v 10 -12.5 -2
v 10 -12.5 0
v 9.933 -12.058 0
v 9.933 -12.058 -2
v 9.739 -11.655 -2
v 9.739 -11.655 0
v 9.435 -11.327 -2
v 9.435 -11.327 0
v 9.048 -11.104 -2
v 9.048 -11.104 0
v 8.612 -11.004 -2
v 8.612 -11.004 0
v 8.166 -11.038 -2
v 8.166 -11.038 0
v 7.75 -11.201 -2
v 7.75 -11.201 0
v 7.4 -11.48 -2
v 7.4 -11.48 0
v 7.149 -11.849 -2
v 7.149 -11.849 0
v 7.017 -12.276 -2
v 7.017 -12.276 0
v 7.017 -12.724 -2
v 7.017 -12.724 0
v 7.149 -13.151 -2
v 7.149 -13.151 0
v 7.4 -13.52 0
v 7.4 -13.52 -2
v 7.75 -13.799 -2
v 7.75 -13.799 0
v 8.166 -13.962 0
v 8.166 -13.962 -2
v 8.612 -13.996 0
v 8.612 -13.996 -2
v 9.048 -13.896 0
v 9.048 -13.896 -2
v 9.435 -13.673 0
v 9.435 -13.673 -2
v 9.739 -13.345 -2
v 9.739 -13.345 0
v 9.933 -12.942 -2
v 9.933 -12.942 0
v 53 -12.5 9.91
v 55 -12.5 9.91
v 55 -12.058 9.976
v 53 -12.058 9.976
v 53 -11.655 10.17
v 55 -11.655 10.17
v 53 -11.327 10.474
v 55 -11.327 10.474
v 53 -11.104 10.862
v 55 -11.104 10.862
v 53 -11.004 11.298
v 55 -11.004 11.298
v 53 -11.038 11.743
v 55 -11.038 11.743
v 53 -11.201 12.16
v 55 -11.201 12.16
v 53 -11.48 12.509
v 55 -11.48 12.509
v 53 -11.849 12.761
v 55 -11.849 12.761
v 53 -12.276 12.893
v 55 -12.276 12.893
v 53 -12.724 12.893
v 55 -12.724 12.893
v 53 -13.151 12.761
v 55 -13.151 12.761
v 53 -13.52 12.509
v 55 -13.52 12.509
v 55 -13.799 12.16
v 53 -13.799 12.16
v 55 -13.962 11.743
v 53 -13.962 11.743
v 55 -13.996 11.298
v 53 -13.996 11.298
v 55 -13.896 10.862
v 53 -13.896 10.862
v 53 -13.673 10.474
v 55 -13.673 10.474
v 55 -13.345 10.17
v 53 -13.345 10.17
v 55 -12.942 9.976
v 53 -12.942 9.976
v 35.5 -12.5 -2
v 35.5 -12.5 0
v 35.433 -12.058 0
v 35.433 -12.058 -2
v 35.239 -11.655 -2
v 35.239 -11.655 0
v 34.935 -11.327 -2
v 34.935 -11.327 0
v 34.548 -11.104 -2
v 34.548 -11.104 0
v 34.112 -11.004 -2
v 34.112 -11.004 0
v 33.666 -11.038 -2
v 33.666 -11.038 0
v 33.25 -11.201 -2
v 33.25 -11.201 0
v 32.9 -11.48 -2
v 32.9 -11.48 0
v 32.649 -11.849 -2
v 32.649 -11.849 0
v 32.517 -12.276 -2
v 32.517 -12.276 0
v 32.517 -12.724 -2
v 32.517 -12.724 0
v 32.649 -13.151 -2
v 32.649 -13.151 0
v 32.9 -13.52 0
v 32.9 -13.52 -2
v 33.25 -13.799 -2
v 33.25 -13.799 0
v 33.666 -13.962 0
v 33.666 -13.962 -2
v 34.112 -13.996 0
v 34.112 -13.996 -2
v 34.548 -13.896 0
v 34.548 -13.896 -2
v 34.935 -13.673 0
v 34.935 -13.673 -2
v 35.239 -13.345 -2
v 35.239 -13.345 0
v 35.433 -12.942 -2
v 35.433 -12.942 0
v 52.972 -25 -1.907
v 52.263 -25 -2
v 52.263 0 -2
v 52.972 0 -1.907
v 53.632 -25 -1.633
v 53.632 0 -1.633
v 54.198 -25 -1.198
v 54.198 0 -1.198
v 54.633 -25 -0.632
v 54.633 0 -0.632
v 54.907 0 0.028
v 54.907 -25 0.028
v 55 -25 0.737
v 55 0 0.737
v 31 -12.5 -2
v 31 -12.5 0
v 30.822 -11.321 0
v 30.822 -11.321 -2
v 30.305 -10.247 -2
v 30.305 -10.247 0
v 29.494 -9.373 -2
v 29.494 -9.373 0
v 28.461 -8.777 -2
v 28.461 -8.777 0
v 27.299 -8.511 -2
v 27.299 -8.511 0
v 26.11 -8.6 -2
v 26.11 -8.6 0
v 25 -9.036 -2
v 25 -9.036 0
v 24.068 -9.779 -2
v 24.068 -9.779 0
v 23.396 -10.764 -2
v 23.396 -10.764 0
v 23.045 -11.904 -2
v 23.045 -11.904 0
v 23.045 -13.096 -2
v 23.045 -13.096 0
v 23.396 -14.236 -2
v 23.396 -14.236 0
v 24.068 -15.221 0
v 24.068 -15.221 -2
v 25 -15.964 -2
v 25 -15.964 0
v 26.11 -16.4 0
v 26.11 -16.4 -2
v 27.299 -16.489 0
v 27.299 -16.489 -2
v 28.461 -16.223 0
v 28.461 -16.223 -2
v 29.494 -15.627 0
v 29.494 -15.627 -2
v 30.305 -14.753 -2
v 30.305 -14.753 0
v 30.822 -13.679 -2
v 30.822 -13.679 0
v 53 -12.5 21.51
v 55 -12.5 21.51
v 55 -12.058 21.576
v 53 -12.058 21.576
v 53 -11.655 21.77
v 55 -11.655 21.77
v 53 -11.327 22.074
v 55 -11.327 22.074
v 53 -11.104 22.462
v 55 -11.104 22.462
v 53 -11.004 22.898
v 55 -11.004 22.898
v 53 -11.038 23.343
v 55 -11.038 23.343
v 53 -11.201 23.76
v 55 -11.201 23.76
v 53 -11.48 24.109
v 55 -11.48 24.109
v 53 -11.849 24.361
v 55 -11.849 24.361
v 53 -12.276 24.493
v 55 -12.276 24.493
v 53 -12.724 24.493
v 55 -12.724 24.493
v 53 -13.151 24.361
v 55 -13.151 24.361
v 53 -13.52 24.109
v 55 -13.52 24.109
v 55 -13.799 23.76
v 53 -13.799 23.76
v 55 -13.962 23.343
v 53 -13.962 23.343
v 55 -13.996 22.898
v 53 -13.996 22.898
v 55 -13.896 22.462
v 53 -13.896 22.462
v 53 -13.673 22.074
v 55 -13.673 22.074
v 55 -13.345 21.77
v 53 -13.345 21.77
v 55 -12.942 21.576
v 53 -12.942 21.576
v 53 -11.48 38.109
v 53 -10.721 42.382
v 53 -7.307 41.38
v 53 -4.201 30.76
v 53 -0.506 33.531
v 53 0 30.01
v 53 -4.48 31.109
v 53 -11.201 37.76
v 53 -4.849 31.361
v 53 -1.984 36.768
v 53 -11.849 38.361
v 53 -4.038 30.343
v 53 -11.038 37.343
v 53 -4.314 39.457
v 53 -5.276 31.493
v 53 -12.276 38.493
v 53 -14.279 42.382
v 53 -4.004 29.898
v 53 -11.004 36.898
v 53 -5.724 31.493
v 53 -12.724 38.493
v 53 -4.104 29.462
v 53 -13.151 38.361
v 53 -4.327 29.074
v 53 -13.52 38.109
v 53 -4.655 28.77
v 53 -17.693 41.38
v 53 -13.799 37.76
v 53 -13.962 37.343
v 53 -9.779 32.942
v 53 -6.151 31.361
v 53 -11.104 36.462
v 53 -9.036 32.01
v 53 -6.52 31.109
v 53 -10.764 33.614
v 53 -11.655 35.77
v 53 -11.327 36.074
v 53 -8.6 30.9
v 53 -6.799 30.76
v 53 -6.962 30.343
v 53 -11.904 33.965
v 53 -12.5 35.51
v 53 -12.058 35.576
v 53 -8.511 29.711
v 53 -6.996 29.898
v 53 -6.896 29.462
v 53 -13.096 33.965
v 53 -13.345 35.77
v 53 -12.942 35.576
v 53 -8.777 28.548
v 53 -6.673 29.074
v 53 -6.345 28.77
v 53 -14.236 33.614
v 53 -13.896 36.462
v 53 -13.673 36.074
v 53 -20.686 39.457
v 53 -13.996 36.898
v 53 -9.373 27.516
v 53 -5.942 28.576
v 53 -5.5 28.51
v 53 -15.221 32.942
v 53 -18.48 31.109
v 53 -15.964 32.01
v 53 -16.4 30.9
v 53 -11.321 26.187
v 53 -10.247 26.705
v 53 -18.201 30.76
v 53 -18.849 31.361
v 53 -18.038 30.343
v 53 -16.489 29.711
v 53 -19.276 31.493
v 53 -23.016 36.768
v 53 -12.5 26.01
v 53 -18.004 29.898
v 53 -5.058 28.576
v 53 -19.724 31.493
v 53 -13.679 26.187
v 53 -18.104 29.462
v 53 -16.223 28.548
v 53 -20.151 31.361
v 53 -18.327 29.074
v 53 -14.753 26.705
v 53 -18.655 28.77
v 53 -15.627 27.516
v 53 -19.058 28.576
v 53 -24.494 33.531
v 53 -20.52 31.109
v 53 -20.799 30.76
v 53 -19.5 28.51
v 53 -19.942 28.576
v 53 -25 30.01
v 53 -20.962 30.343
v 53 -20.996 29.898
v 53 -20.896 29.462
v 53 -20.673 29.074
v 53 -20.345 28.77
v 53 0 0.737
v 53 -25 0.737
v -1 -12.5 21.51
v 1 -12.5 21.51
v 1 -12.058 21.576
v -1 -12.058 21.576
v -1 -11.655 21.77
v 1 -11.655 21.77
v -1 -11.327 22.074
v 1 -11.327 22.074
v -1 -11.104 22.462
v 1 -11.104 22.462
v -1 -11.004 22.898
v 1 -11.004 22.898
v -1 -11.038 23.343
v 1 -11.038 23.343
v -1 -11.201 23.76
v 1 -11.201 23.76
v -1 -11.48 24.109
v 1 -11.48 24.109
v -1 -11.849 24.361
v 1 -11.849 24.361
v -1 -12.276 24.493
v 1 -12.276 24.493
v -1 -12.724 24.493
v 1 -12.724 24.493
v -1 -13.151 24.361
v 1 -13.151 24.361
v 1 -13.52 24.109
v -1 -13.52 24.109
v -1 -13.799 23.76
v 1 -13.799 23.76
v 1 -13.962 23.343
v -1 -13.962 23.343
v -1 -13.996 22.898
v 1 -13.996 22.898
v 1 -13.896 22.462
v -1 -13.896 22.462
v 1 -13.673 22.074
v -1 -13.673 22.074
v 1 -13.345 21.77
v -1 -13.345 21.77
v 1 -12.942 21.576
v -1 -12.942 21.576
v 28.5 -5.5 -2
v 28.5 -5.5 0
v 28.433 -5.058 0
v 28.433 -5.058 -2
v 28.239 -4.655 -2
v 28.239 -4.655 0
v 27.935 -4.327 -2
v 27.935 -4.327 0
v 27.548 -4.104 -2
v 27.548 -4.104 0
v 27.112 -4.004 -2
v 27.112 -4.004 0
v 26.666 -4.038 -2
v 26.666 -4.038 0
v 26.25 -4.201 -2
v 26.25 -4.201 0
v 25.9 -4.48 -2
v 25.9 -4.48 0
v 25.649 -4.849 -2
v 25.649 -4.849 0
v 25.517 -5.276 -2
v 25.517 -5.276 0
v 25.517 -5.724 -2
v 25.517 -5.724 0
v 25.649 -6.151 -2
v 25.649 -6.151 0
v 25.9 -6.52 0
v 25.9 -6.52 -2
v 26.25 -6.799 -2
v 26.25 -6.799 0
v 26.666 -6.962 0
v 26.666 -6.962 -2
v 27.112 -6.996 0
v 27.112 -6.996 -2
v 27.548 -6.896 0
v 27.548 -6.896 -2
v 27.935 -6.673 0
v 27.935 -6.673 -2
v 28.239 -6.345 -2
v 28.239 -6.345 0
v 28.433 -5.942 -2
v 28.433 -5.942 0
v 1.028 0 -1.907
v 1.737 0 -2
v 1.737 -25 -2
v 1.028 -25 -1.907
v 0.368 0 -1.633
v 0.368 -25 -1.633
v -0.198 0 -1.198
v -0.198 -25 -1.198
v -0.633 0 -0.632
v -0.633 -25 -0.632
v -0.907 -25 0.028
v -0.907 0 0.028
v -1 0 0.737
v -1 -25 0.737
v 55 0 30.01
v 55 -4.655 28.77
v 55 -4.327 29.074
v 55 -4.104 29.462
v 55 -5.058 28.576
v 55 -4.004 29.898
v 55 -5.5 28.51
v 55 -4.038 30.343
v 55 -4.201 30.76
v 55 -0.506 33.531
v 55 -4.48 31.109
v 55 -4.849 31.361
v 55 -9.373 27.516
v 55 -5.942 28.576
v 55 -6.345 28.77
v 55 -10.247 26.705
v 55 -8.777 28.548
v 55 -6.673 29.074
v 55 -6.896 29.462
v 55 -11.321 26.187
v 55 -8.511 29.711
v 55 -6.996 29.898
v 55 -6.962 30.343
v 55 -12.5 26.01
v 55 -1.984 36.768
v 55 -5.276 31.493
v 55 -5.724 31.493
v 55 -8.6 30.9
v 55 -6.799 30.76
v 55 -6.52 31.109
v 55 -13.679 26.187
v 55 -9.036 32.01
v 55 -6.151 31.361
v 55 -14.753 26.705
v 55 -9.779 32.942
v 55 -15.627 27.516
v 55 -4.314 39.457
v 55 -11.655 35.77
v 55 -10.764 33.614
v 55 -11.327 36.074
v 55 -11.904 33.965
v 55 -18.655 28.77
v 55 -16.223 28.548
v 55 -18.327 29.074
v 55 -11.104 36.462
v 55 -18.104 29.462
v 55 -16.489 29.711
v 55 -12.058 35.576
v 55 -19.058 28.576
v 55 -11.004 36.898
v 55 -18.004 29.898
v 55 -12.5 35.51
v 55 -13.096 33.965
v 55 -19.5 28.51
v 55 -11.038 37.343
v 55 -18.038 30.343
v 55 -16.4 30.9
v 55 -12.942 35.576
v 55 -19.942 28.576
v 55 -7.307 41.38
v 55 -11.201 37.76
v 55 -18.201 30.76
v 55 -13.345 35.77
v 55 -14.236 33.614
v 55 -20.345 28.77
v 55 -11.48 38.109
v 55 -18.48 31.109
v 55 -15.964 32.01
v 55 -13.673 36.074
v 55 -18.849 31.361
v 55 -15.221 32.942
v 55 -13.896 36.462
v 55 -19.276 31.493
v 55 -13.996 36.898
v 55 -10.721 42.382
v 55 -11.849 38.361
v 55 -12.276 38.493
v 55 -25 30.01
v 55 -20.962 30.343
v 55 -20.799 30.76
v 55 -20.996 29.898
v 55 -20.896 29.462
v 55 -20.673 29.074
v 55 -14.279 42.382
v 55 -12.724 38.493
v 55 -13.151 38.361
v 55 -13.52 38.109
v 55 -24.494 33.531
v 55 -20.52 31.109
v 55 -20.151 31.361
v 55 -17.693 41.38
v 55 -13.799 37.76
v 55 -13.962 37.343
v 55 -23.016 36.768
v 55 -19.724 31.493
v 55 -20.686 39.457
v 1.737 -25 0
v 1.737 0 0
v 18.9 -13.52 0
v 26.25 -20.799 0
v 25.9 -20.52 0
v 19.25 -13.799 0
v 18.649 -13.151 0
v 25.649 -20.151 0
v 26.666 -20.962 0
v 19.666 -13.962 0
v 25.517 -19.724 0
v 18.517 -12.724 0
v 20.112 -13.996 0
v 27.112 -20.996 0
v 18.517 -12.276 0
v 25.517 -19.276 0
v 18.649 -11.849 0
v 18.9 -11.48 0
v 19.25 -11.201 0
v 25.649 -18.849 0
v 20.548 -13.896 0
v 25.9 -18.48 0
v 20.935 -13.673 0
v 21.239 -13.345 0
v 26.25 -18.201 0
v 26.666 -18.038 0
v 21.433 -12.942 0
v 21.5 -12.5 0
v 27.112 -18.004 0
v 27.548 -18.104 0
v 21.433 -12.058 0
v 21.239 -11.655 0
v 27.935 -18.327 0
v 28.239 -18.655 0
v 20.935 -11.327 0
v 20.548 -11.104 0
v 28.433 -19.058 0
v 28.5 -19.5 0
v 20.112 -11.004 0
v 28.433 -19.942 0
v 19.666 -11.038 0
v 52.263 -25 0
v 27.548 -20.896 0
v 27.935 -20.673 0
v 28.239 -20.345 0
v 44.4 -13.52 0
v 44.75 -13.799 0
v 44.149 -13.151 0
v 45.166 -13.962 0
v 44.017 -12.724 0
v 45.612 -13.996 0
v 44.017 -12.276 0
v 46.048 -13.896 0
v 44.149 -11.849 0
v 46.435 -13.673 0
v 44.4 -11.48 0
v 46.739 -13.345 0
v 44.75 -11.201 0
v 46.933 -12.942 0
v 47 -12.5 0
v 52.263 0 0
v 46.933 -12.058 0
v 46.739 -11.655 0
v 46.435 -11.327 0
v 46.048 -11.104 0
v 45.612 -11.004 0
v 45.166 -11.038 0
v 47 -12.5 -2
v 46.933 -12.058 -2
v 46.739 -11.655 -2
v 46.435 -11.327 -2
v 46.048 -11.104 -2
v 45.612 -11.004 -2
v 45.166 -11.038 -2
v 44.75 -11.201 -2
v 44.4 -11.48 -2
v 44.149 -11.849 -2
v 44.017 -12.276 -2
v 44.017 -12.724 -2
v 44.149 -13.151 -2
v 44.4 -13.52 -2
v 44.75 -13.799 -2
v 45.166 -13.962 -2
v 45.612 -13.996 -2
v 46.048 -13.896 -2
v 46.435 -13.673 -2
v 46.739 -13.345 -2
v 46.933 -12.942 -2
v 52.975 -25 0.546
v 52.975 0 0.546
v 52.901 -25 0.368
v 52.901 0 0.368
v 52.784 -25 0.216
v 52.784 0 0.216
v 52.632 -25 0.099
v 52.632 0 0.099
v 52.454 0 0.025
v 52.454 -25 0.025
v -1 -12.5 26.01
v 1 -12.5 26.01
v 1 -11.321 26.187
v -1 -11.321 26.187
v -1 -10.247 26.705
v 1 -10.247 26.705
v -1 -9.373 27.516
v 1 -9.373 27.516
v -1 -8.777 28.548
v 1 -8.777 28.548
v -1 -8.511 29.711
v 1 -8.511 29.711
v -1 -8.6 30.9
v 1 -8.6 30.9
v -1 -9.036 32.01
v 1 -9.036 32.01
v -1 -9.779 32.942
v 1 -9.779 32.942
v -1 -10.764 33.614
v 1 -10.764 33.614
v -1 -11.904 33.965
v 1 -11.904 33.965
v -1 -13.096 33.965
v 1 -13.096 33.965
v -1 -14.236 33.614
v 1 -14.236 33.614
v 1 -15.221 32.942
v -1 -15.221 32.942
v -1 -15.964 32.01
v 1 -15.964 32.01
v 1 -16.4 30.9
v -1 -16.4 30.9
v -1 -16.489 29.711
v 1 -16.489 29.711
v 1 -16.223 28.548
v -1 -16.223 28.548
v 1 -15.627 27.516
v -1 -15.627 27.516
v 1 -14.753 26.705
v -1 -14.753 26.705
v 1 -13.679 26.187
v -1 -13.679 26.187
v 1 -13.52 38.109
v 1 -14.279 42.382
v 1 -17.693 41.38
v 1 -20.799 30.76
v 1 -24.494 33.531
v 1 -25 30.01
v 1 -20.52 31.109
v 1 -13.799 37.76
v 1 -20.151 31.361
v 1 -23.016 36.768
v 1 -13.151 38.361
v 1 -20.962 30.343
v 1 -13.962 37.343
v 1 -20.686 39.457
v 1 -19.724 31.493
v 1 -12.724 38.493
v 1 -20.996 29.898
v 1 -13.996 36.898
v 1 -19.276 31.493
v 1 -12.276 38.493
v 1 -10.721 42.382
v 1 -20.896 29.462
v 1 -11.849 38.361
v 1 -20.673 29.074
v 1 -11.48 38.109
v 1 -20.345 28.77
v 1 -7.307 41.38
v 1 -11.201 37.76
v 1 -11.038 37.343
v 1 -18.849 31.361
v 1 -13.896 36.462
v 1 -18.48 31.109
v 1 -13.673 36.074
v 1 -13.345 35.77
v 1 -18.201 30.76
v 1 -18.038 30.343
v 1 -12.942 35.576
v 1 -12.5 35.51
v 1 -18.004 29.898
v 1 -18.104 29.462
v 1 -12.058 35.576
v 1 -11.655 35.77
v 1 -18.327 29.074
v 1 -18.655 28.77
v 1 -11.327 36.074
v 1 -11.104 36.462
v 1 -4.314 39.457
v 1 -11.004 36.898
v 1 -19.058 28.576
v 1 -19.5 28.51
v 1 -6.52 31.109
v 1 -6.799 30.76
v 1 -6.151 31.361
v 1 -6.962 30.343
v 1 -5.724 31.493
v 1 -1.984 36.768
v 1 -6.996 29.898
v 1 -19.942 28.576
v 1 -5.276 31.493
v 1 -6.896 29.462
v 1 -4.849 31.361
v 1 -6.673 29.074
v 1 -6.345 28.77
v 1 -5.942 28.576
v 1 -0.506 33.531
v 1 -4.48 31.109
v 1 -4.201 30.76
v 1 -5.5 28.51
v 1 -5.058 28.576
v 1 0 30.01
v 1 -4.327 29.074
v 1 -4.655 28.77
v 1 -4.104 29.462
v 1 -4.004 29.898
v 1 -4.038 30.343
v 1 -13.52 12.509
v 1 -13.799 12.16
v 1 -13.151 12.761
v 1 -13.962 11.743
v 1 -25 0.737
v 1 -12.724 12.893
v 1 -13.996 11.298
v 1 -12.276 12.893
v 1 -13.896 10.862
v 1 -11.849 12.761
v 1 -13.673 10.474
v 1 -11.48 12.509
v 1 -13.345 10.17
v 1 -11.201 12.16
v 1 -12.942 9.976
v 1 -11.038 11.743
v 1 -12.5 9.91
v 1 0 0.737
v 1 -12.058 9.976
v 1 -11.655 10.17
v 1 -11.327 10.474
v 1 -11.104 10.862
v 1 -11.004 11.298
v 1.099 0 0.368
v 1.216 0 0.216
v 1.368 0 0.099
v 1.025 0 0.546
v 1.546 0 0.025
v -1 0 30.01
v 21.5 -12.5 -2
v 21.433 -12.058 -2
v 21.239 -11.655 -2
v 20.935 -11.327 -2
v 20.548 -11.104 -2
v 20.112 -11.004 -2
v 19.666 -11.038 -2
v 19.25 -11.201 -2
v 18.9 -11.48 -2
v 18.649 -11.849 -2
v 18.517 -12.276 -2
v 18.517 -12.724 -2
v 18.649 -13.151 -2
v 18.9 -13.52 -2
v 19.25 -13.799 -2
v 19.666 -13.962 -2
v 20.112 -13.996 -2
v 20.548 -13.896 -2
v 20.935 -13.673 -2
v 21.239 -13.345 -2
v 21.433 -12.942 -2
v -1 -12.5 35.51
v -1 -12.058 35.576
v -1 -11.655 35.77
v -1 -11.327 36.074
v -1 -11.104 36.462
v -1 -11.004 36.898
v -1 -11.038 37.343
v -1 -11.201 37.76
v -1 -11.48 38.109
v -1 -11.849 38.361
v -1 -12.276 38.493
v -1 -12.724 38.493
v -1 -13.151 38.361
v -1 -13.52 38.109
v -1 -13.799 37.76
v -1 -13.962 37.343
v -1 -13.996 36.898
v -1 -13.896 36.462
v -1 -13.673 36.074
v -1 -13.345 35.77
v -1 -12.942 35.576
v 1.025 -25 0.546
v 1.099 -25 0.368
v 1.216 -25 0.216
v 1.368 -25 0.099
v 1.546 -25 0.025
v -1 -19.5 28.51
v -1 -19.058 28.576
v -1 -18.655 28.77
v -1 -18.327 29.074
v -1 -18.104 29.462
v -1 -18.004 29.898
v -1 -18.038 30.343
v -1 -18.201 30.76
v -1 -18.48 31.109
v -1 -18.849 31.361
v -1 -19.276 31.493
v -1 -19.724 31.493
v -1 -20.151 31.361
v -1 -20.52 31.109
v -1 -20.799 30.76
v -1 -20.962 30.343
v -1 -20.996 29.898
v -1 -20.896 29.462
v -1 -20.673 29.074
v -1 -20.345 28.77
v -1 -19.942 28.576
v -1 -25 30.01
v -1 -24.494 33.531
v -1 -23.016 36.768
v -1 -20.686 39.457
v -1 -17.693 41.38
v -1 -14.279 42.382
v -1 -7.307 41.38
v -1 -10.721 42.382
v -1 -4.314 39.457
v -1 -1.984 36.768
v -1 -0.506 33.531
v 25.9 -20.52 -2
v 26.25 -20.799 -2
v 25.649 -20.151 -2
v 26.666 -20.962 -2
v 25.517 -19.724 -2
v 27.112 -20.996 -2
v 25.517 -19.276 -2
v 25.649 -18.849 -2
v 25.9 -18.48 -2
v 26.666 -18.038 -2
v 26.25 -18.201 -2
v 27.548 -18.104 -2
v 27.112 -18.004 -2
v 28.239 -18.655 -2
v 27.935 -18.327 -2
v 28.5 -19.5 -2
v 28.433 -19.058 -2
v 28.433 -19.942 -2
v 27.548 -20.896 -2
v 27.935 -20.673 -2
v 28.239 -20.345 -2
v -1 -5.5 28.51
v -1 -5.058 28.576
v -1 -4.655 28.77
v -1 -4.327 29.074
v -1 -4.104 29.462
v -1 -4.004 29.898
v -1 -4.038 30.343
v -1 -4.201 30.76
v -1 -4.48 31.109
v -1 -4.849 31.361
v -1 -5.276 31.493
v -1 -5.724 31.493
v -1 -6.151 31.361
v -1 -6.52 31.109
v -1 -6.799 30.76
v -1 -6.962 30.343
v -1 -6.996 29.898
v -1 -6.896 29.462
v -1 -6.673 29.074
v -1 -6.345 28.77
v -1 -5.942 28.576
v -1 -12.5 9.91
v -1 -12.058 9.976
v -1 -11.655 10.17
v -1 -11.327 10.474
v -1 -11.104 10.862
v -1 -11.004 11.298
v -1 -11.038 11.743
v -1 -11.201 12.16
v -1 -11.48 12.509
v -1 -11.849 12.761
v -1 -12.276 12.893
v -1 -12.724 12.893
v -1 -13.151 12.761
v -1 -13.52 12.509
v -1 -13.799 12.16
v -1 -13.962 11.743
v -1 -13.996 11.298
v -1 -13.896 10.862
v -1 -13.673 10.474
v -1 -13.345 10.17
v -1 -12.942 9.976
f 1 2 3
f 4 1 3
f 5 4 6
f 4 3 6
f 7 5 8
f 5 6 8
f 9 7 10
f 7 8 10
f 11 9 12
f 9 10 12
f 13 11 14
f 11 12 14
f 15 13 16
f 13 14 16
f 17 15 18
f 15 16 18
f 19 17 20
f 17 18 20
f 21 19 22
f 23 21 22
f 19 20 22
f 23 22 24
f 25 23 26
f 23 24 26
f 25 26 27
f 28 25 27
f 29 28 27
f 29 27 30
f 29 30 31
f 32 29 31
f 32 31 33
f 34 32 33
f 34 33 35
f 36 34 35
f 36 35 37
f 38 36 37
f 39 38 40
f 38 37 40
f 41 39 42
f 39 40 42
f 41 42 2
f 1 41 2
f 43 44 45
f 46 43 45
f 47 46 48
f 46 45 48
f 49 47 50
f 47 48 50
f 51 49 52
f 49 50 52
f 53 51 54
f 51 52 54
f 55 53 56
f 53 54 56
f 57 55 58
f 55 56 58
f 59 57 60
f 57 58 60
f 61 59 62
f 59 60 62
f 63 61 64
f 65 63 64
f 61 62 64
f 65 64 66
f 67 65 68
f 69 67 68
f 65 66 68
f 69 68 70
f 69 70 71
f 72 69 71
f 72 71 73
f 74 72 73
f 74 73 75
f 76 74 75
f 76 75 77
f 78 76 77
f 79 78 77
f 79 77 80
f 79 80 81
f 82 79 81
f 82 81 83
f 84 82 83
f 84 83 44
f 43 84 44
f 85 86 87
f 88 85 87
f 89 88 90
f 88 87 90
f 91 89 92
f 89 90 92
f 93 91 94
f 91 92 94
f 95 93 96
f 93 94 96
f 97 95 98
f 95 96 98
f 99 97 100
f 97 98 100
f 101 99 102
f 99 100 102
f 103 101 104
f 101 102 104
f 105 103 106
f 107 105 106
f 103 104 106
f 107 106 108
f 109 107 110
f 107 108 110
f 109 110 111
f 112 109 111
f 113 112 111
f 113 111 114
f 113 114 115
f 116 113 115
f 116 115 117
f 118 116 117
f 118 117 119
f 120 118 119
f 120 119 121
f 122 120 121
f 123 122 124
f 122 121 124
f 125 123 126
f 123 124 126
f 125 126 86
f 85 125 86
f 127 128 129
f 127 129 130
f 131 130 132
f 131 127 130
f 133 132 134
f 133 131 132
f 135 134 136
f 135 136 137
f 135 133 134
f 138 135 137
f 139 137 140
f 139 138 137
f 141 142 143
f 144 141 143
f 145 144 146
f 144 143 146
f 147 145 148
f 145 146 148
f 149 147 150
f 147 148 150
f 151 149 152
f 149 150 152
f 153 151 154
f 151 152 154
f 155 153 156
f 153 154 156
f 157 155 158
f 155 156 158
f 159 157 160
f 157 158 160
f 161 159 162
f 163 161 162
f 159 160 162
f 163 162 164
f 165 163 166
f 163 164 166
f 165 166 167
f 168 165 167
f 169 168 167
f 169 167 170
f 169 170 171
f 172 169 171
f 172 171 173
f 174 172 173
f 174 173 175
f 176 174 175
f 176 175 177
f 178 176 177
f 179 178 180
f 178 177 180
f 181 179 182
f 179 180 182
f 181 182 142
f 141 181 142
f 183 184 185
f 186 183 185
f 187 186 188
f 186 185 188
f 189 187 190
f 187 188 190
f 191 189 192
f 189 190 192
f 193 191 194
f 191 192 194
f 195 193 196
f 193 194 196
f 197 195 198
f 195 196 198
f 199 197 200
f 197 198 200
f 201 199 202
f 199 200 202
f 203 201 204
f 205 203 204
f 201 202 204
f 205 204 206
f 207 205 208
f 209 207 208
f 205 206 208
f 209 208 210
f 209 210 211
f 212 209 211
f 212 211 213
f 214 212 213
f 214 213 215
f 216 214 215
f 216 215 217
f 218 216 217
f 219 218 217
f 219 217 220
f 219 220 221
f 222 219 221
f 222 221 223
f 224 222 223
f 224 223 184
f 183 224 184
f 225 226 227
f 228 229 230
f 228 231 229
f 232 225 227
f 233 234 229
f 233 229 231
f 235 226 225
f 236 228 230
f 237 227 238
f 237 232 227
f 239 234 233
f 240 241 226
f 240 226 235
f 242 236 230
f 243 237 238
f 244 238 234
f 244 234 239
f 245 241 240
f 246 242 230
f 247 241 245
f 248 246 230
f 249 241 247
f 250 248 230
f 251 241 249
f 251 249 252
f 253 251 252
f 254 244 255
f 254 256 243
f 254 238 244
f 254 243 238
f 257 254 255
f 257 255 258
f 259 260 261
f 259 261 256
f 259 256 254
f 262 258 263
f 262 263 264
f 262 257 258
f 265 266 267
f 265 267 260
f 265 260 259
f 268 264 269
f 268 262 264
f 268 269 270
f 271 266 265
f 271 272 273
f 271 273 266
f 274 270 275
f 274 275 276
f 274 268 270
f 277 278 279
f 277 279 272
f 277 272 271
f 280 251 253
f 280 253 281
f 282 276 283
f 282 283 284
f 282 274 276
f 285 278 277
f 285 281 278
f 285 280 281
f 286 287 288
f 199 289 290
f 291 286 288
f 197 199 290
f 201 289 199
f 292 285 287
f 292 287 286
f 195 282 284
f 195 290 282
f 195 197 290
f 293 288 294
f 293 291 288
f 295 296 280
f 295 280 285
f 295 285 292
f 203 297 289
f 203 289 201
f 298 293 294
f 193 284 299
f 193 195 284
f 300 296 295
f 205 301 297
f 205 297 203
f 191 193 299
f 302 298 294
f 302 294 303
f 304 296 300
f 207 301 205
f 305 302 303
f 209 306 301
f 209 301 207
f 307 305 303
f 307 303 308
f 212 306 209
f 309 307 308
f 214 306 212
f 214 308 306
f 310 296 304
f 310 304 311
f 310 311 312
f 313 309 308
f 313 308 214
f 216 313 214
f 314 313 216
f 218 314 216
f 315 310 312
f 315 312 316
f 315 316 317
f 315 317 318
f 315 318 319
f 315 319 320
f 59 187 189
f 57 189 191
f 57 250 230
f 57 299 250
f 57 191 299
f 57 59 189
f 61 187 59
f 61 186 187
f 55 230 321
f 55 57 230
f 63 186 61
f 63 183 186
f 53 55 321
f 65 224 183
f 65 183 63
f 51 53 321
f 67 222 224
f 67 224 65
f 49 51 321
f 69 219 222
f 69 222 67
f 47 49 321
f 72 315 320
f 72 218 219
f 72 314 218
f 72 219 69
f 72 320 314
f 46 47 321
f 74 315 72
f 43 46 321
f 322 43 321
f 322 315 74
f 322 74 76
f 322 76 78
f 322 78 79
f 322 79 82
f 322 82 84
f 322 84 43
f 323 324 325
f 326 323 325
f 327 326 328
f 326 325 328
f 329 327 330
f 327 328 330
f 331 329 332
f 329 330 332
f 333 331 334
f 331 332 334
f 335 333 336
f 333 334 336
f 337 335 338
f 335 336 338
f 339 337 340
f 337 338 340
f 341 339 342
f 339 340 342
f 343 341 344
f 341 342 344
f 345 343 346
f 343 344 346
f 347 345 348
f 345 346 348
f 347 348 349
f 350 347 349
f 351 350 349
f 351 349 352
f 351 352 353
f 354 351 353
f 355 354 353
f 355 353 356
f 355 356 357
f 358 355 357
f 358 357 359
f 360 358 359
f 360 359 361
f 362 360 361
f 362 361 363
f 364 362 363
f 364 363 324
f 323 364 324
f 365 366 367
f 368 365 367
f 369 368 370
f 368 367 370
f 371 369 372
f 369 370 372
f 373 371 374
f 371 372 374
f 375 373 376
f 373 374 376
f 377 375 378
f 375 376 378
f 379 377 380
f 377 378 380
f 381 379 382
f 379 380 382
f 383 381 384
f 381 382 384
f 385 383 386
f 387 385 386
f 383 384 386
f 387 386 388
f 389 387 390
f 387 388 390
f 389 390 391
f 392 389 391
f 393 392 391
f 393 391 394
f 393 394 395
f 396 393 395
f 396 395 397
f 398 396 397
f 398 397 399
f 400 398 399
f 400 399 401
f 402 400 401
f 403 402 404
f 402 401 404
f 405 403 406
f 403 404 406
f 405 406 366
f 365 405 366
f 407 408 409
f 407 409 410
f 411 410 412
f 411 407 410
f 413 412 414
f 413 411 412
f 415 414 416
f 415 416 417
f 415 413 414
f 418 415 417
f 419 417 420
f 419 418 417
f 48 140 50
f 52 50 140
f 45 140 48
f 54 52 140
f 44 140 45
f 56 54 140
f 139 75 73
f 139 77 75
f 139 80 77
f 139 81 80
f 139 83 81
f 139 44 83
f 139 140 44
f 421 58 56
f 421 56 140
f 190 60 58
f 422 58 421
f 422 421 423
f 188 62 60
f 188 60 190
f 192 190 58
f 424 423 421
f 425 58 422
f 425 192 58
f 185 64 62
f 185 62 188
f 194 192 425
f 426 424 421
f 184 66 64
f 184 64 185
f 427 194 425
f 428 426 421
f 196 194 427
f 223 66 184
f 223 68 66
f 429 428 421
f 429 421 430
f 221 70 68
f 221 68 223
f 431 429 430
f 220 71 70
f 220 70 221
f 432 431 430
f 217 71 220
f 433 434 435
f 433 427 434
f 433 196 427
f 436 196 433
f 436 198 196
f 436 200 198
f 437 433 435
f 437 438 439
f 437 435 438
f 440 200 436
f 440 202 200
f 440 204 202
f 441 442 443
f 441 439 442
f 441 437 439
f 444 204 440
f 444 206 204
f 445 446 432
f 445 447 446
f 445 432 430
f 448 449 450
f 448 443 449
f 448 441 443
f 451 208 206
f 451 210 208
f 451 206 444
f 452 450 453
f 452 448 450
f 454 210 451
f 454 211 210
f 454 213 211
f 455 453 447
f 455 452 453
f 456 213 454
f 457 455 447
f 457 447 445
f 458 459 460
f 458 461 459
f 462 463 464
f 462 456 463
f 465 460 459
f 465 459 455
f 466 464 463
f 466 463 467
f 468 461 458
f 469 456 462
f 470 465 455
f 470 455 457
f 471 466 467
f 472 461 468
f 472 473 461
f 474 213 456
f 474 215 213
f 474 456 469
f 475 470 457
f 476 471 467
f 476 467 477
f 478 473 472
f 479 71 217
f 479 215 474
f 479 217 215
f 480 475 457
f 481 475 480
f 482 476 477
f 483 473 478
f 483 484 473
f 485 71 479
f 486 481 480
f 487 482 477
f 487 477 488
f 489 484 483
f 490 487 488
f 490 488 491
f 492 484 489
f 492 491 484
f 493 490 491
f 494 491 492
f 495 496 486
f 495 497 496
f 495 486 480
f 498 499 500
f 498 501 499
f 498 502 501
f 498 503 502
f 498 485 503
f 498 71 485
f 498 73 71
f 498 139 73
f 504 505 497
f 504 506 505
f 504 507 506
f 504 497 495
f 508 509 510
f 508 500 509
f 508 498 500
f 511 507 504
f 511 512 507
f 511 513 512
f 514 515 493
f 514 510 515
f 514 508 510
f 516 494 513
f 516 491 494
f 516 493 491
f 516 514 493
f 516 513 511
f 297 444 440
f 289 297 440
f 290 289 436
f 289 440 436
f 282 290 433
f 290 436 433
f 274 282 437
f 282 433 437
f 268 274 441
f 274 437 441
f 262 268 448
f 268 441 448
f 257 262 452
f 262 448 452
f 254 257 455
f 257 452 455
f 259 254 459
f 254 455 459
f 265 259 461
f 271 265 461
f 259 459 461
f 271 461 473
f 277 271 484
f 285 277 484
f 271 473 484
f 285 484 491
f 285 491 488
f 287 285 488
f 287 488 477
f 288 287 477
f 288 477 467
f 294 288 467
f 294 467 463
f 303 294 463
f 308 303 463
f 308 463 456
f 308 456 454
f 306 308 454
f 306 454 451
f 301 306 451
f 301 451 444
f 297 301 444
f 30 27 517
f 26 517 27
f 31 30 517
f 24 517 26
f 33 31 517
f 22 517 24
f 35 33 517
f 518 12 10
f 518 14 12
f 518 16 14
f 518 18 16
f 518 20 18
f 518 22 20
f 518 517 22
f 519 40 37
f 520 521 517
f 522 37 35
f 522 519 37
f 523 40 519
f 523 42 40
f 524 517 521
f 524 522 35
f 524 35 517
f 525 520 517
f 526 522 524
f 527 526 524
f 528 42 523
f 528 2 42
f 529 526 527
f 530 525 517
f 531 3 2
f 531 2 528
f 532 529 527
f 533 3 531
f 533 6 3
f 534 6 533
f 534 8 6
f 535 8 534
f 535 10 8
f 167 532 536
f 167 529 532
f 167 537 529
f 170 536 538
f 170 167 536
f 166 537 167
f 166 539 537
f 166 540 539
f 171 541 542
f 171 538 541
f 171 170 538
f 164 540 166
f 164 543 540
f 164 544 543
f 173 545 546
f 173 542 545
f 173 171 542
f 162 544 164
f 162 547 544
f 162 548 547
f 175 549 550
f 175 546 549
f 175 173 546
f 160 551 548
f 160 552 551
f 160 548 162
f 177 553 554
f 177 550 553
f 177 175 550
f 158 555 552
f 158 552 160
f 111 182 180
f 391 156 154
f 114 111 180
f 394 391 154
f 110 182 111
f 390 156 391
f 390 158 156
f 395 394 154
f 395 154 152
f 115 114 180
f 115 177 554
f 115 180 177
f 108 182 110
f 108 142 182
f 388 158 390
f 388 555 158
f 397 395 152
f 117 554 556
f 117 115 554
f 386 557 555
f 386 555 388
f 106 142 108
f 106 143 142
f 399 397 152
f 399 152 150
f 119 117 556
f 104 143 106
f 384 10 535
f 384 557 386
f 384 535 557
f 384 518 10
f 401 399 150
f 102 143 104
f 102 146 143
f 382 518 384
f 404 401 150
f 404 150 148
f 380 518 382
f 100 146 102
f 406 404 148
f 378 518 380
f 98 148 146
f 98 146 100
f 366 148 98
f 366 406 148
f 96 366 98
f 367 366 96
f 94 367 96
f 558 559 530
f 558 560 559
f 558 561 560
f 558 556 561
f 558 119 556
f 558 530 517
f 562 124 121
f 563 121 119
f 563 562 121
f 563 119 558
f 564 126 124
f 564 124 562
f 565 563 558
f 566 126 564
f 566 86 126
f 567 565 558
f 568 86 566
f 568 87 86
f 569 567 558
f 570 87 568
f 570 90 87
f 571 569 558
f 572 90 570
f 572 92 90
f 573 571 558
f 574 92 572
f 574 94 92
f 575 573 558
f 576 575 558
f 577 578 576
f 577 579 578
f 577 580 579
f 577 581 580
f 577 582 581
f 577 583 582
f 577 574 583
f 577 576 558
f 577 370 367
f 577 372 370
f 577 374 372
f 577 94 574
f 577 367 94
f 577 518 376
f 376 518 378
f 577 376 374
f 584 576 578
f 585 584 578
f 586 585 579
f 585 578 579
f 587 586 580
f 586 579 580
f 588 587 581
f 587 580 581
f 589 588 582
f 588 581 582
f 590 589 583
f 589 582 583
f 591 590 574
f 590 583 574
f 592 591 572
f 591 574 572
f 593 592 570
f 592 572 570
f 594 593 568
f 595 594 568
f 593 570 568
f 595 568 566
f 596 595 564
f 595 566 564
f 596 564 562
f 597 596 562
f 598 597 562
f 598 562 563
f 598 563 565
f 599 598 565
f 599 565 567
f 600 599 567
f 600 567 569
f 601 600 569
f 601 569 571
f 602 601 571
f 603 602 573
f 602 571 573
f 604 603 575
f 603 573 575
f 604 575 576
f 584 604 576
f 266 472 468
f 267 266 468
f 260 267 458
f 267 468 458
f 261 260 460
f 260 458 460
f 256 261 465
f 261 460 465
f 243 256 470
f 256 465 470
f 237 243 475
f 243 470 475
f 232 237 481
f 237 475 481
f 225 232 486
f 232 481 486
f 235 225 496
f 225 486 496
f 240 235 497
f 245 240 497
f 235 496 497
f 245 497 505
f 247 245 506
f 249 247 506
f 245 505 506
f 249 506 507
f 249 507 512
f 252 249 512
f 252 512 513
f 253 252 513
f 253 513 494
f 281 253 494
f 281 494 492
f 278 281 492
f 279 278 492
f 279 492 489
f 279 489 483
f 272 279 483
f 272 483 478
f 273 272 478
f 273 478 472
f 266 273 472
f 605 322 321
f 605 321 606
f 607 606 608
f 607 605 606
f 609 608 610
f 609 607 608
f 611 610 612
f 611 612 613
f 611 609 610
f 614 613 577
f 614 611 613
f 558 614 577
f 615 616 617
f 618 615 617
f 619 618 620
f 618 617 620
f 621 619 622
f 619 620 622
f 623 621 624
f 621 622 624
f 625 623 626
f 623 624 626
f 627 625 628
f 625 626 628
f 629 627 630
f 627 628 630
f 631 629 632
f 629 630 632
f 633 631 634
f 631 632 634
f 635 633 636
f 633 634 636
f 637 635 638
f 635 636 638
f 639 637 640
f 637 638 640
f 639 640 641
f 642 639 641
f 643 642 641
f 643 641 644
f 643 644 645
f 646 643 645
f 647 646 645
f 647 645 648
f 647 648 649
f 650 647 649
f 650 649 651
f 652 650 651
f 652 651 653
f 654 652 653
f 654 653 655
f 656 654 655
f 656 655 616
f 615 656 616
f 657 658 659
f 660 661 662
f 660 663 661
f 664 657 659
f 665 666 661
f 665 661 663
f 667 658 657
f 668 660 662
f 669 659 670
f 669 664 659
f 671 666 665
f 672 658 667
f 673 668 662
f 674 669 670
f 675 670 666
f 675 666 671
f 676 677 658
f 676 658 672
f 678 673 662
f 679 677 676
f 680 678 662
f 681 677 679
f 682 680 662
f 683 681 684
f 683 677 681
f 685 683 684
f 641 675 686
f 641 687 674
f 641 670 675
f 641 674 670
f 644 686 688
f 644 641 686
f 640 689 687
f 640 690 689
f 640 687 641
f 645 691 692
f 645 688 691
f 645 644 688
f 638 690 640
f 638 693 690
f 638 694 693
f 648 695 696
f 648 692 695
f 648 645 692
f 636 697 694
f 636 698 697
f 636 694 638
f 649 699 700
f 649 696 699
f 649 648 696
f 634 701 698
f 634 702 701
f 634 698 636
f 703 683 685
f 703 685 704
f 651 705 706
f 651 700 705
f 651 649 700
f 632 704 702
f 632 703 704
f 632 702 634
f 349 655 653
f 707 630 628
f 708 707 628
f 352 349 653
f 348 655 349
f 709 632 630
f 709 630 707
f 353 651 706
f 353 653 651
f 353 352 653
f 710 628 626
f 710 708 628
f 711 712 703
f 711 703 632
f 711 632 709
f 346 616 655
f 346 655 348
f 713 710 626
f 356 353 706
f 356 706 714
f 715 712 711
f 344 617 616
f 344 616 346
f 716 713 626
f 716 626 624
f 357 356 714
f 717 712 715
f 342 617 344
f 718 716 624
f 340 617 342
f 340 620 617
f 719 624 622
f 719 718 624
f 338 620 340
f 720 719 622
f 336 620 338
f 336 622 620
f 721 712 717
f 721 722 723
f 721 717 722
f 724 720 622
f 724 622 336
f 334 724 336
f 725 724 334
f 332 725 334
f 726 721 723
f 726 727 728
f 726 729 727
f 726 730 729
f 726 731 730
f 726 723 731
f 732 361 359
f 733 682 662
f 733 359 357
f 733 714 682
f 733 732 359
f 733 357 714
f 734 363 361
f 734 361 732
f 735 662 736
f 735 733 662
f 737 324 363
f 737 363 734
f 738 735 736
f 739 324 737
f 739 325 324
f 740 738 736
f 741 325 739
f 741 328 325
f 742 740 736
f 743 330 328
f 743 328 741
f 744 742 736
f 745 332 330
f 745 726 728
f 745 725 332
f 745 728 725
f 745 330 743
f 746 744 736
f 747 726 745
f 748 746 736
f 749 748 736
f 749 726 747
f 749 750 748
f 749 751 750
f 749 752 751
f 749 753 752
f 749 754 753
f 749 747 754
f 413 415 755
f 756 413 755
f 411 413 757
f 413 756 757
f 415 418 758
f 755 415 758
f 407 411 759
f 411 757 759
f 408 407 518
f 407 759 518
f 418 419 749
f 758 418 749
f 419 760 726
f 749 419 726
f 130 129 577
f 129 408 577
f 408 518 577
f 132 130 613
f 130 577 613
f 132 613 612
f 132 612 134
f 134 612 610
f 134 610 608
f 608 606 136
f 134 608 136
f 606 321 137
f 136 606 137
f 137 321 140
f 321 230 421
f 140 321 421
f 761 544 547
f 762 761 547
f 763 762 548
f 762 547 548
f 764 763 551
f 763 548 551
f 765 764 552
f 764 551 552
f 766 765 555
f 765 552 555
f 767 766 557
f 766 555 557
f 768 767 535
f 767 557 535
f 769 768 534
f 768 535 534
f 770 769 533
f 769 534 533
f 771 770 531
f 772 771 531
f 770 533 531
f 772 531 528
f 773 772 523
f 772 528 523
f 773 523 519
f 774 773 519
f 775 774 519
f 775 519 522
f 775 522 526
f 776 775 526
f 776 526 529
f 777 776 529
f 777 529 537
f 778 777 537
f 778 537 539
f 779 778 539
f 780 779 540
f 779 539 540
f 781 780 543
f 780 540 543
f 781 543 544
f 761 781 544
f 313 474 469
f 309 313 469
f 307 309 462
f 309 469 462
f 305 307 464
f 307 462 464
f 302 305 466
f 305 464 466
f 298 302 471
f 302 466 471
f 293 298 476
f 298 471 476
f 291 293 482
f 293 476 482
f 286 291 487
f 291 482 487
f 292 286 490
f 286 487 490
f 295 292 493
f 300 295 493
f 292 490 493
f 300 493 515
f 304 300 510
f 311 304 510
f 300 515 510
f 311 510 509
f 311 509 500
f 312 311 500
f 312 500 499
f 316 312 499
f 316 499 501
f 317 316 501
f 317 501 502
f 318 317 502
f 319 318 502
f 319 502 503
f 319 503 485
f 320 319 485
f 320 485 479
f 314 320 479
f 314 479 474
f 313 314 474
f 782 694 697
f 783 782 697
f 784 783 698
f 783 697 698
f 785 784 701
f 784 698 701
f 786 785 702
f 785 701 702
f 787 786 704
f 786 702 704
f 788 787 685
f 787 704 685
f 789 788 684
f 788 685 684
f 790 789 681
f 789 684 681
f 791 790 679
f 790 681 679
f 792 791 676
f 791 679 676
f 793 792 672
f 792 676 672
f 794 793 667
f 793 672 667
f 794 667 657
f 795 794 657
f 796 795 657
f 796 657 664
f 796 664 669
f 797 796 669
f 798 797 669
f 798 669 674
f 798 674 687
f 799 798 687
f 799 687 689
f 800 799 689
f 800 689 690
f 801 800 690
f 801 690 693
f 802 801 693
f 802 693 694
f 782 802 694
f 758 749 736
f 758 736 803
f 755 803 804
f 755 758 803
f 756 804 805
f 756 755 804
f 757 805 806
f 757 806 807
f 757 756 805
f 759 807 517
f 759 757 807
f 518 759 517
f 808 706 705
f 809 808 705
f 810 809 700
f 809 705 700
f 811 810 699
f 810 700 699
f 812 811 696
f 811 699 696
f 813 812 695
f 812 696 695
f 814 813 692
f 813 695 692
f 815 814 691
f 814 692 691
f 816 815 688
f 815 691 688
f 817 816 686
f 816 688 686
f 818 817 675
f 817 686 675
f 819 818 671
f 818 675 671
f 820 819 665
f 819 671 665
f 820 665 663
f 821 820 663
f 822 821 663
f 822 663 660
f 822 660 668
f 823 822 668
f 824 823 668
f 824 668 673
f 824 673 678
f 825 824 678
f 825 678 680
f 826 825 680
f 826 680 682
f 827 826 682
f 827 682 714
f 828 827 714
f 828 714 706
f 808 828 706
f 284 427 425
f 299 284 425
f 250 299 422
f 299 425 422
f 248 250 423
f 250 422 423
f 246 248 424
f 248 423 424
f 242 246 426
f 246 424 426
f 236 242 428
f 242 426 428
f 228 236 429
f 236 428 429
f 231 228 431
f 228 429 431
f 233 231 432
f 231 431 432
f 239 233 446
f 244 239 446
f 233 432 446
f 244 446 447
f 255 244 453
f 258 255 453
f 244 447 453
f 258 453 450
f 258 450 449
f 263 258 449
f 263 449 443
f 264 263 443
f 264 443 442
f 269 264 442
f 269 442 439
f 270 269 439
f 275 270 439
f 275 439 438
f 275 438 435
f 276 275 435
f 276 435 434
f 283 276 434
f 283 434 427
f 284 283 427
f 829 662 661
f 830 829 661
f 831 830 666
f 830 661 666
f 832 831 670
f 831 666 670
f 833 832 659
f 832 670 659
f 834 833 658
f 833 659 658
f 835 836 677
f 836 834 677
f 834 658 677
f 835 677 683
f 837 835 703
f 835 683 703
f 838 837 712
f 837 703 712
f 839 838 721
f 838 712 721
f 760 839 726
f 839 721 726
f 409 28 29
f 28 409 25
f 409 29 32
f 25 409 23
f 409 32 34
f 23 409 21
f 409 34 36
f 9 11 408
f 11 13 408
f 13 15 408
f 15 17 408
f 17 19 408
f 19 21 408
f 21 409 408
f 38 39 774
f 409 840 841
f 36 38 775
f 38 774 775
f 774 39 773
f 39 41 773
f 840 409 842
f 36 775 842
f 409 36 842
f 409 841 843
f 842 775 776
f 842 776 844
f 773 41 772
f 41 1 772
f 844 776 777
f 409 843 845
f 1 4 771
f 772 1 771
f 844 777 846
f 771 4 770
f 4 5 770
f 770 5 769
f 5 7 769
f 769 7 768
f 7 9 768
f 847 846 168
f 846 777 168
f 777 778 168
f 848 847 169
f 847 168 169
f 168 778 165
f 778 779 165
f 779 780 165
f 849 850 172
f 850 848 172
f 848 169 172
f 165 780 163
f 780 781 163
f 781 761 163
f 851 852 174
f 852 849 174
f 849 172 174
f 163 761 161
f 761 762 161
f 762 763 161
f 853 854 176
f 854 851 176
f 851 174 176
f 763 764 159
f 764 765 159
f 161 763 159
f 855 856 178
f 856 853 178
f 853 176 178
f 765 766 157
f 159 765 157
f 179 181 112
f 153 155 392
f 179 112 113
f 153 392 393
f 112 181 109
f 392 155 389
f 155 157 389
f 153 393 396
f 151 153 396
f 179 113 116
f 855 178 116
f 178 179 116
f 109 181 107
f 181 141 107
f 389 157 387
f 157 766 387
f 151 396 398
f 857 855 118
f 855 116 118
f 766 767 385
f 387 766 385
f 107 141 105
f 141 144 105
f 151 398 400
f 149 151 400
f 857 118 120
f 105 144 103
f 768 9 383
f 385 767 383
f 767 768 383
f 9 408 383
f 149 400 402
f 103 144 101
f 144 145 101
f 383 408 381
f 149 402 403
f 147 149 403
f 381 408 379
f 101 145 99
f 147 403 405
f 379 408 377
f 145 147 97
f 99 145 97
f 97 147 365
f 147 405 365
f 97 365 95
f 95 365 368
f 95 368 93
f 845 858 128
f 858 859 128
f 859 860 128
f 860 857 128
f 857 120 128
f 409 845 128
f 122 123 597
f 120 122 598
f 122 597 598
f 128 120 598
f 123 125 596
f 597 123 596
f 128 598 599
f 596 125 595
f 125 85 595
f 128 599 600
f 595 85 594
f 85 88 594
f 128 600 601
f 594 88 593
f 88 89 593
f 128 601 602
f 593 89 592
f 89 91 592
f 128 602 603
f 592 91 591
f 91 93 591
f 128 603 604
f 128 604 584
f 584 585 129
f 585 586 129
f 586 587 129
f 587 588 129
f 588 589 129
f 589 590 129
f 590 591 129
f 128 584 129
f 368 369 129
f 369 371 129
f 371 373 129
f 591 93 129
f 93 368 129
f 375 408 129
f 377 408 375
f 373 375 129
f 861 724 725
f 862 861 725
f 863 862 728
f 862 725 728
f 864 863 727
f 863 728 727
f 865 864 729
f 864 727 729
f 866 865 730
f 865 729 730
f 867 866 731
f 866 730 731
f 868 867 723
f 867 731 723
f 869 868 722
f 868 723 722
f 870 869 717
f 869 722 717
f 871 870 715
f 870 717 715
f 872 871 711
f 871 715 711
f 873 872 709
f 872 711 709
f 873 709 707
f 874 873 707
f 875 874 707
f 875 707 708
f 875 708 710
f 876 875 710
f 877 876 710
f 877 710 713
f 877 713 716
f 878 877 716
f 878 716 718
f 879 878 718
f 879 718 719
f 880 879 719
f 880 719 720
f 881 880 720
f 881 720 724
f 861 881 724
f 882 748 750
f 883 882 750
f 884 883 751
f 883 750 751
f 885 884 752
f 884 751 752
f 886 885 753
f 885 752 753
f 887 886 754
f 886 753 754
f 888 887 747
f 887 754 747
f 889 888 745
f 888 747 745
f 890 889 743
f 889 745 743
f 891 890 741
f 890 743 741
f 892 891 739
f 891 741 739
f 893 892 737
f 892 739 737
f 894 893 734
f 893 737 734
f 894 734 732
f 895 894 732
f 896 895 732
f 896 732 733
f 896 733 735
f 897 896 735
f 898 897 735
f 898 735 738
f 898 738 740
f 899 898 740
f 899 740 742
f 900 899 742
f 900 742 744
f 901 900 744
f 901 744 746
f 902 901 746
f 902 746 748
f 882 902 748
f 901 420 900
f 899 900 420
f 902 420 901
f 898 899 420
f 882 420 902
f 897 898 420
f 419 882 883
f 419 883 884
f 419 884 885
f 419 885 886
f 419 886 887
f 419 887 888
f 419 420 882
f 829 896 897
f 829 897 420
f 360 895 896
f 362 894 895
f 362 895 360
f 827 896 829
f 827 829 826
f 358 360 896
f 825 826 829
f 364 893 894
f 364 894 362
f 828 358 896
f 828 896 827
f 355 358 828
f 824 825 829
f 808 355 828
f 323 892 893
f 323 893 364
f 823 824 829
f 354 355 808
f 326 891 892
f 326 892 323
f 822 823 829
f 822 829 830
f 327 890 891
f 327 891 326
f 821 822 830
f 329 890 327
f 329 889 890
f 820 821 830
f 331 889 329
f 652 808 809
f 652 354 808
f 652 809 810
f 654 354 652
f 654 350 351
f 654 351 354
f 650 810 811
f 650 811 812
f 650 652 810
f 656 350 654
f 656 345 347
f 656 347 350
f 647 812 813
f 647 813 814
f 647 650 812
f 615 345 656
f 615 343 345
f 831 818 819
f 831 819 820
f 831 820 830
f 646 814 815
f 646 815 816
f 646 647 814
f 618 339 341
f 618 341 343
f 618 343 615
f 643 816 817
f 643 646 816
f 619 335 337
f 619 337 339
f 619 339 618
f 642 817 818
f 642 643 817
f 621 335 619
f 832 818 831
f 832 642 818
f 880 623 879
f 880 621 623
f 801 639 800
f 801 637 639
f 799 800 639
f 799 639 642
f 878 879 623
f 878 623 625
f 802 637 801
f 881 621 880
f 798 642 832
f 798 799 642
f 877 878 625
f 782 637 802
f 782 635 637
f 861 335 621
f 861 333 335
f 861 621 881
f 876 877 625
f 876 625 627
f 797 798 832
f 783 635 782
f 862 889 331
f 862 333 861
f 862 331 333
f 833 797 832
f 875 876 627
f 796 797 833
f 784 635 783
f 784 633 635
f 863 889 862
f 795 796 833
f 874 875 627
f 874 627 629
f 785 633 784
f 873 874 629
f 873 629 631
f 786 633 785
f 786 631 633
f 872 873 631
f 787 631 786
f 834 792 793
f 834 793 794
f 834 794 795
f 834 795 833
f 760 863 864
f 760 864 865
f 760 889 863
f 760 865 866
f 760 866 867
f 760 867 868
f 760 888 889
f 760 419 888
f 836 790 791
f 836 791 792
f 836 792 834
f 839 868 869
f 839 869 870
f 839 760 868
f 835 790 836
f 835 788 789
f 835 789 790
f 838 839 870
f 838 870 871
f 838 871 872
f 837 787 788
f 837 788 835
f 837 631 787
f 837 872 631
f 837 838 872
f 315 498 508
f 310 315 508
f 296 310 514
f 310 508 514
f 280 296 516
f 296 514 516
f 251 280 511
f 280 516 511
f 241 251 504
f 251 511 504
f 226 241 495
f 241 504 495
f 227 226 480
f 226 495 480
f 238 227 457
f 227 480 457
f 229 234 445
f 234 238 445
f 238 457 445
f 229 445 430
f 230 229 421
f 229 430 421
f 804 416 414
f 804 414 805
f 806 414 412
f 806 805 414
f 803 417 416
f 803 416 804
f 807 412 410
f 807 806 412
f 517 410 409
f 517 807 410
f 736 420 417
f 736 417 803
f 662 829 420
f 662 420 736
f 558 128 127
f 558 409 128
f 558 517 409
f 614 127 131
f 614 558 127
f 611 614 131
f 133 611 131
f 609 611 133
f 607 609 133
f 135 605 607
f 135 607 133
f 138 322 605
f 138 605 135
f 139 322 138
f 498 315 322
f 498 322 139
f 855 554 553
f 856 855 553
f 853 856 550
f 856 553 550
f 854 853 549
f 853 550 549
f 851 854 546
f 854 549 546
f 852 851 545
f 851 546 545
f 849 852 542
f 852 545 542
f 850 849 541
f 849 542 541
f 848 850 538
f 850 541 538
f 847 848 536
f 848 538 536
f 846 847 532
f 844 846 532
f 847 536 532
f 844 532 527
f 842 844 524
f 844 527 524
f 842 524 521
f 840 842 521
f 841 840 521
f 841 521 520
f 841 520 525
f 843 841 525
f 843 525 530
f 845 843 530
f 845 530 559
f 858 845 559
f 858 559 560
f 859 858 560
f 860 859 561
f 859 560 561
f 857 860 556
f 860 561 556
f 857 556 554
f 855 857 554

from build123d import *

# Parameters (mm, degrees)
SKETCH_1_W                         = 54
SKETCH_1_H                         = 25
SKETCH_1_R                         = 4
SKETCH_1_R_2                       = 1.5
SM_BASE_FLANGE_1_DEPTH             = 2
SM_EDGE_FLANGE_1_STRIP_W           = 10.4732
SM_EDGE_FLANGE_1_STRIP_H           = 2
SM_EDGE_FLANGE_1_STRIP_CUT_DEPTH   = 25
SM_EDGE_FLANGE_1_STRIP_2_W         = 10.4732
SM_EDGE_FLANGE_1_STRIP_2_H         = 2
SM_EDGE_FLANGE_1_STRIP_CUT_2_DEPTH = 25
SM_EDGE_FLANGE_1_DEPTH             = 25
SM_EDGE_FLANGE_1_BEND_DEPTH        = 25
CUT_EXTRUDE_2_DEPTH                = 76.771036683
SKETCH_13_R                        = 4
SKETCH_13_R_2                      = 1.5
CUT_EXTRUDE_3_DEPTH                = 75.619515469


# Sheet-metal steps are written as plain solids
with BuildPart() as part:
    # Sketch 1 → 基体-法兰1 (new body)
    with BuildSketch(Plane.XY):
        with Locations((27, -12.5)):
            Rectangle(SKETCH_1_W, SKETCH_1_H)
        with Locations((27, -12.5)):
            Circle(SKETCH_1_R, mode=Mode.SUBTRACT)
        with Locations((27, -5.5)):
            Circle(SKETCH_1_R_2, mode=Mode.SUBTRACT)
        with Locations((27, -19.5)):
            Circle(SKETCH_1_R_2, mode=Mode.SUBTRACT)
        with Locations((34, -12.5)):
            Circle(SKETCH_1_R_2, mode=Mode.SUBTRACT)
        with Locations((20, -12.5)):
            Circle(SKETCH_1_R_2, mode=Mode.SUBTRACT)
        with Locations((45.5, -12.5)):
            Circle(SKETCH_1_R_2, mode=Mode.SUBTRACT)
        with Locations((8.5, -12.5)):
            Circle(SKETCH_1_R_2, mode=Mode.SUBTRACT)
    extrude(amount=-SM_BASE_FLANGE_1_DEPTH)

    # 边线-法兰1 strip (across the edge) → 边线-法兰1 strip cut (cut)
    with BuildSketch(Plane(origin=(-1, 0, 0), x_dir=(1, 0, 0), z_dir=(0, -1, 0))):
        with Locations((-2.5, -1)):
            Rectangle(SM_EDGE_FLANGE_1_STRIP_W, SM_EDGE_FLANGE_1_STRIP_H)
    extrude(amount=SM_EDGE_FLANGE_1_STRIP_CUT_DEPTH, mode=Mode.SUBTRACT)

    # 边线-法兰1 strip 2 (across the edge) → 边线-法兰1 strip cut 2 (cut)
    with BuildSketch(Plane(origin=(55, -25, 0), x_dir=(-1, 0, 0), z_dir=(0, 1, 0))):
        with Locations((-2.5, -1)):
            Rectangle(SM_EDGE_FLANGE_1_STRIP_2_W, SM_EDGE_FLANGE_1_STRIP_2_H)
    extrude(amount=SM_EDGE_FLANGE_1_STRIP_CUT_2_DEPTH, mode=Mode.SUBTRACT)

    # 边线-法兰1 section (across the edge) → 边线-法兰1 (add)
    with BuildSketch(Plane(origin=(-1, 0, 0), x_dir=(1, 0, 0), z_dir=(0, -1, 0))):
        with BuildLine():
            Line((0, 0.7366), (0, 44.5))
            Line((0, 44.5), (2, 44.5))
            Line((2, 44.5), (2, 0.7366))
            ThreePointArc((2, 0.7366), (2.215745145, 0.215745145), (2.7366, 0))
            Line((2.7366, 0), (2.7366, -2))
            ThreePointArc((2.7366, -2), (0.801531583, -1.198468417), (0, 0.7366))
        make_face()
    extrude(amount=SM_EDGE_FLANGE_1_DEPTH)

    # 边线-法兰1 section 2 (across the edge) → 边线-法兰1 bend (add)
    with BuildSketch(Plane(origin=(55, -25, 0), x_dir=(-1, 0, 0), z_dir=(0, 1, 0))):
        with BuildLine():
            Line((0, 0.7366), (0, 44.5))
            Line((0, 44.5), (2, 44.5))
            Line((2, 44.5), (2, 0.7366))
            ThreePointArc((2, 0.7366), (2.215745145, 0.215745145), (2.7366, 0))
            Line((2.7366, 0), (2.7366, -2))
            ThreePointArc((2.7366, -2), (0.801531583, -1.198468417), (0, 0.7366))
        make_face()
    extrude(amount=SM_EDGE_FLANGE_1_BEND_DEPTH)

    # 草图12 → 切除-拉伸2 (cut, through all)
    with BuildSketch(Plane(origin=(55, 0, 0), x_dir=(0, 0, -1), z_dir=(1, 0, 0))):
        with BuildLine():
            ThreePointArc((-30.009670534, -25), (-42.509670534, -12.5), (-30.009670534, 0))
            Line((-30.009670534, 0), (-44.5, 0))
            Line((-44.5, 0), (-44.5, -25))
            Line((-44.5, -25), (-30.009670534, -25))
        make_face()
    extrude(amount=-CUT_EXTRUDE_2_DEPTH, mode=Mode.SUBTRACT)

    # 草图13 → 切除-拉伸3 (cut, through all)
    with BuildSketch(Plane(origin=(55, 0, 0), x_dir=(0, 0, -1), z_dir=(1, 0, 0))):
        with Locations((-30.009670534, -12.5)):
            Circle(SKETCH_13_R)
        with Locations((-30.009670534, -19.5)):
            Circle(SKETCH_13_R_2)
        with Locations((-37.009670534, -12.5)):
            Circle(SKETCH_13_R_2)
        with Locations((-30.009670534, -5.5)):
            Circle(SKETCH_13_R_2)
        with Locations((-23.009670534, -12.5)):
            Circle(SKETCH_13_R_2)
        with Locations((-11.409670534, -12.5)):
            Circle(SKETCH_13_R_2)
    extrude(amount=-CUT_EXTRUDE_3_DEPTH, mode=Mode.SUBTRACT)


solid = part.part
